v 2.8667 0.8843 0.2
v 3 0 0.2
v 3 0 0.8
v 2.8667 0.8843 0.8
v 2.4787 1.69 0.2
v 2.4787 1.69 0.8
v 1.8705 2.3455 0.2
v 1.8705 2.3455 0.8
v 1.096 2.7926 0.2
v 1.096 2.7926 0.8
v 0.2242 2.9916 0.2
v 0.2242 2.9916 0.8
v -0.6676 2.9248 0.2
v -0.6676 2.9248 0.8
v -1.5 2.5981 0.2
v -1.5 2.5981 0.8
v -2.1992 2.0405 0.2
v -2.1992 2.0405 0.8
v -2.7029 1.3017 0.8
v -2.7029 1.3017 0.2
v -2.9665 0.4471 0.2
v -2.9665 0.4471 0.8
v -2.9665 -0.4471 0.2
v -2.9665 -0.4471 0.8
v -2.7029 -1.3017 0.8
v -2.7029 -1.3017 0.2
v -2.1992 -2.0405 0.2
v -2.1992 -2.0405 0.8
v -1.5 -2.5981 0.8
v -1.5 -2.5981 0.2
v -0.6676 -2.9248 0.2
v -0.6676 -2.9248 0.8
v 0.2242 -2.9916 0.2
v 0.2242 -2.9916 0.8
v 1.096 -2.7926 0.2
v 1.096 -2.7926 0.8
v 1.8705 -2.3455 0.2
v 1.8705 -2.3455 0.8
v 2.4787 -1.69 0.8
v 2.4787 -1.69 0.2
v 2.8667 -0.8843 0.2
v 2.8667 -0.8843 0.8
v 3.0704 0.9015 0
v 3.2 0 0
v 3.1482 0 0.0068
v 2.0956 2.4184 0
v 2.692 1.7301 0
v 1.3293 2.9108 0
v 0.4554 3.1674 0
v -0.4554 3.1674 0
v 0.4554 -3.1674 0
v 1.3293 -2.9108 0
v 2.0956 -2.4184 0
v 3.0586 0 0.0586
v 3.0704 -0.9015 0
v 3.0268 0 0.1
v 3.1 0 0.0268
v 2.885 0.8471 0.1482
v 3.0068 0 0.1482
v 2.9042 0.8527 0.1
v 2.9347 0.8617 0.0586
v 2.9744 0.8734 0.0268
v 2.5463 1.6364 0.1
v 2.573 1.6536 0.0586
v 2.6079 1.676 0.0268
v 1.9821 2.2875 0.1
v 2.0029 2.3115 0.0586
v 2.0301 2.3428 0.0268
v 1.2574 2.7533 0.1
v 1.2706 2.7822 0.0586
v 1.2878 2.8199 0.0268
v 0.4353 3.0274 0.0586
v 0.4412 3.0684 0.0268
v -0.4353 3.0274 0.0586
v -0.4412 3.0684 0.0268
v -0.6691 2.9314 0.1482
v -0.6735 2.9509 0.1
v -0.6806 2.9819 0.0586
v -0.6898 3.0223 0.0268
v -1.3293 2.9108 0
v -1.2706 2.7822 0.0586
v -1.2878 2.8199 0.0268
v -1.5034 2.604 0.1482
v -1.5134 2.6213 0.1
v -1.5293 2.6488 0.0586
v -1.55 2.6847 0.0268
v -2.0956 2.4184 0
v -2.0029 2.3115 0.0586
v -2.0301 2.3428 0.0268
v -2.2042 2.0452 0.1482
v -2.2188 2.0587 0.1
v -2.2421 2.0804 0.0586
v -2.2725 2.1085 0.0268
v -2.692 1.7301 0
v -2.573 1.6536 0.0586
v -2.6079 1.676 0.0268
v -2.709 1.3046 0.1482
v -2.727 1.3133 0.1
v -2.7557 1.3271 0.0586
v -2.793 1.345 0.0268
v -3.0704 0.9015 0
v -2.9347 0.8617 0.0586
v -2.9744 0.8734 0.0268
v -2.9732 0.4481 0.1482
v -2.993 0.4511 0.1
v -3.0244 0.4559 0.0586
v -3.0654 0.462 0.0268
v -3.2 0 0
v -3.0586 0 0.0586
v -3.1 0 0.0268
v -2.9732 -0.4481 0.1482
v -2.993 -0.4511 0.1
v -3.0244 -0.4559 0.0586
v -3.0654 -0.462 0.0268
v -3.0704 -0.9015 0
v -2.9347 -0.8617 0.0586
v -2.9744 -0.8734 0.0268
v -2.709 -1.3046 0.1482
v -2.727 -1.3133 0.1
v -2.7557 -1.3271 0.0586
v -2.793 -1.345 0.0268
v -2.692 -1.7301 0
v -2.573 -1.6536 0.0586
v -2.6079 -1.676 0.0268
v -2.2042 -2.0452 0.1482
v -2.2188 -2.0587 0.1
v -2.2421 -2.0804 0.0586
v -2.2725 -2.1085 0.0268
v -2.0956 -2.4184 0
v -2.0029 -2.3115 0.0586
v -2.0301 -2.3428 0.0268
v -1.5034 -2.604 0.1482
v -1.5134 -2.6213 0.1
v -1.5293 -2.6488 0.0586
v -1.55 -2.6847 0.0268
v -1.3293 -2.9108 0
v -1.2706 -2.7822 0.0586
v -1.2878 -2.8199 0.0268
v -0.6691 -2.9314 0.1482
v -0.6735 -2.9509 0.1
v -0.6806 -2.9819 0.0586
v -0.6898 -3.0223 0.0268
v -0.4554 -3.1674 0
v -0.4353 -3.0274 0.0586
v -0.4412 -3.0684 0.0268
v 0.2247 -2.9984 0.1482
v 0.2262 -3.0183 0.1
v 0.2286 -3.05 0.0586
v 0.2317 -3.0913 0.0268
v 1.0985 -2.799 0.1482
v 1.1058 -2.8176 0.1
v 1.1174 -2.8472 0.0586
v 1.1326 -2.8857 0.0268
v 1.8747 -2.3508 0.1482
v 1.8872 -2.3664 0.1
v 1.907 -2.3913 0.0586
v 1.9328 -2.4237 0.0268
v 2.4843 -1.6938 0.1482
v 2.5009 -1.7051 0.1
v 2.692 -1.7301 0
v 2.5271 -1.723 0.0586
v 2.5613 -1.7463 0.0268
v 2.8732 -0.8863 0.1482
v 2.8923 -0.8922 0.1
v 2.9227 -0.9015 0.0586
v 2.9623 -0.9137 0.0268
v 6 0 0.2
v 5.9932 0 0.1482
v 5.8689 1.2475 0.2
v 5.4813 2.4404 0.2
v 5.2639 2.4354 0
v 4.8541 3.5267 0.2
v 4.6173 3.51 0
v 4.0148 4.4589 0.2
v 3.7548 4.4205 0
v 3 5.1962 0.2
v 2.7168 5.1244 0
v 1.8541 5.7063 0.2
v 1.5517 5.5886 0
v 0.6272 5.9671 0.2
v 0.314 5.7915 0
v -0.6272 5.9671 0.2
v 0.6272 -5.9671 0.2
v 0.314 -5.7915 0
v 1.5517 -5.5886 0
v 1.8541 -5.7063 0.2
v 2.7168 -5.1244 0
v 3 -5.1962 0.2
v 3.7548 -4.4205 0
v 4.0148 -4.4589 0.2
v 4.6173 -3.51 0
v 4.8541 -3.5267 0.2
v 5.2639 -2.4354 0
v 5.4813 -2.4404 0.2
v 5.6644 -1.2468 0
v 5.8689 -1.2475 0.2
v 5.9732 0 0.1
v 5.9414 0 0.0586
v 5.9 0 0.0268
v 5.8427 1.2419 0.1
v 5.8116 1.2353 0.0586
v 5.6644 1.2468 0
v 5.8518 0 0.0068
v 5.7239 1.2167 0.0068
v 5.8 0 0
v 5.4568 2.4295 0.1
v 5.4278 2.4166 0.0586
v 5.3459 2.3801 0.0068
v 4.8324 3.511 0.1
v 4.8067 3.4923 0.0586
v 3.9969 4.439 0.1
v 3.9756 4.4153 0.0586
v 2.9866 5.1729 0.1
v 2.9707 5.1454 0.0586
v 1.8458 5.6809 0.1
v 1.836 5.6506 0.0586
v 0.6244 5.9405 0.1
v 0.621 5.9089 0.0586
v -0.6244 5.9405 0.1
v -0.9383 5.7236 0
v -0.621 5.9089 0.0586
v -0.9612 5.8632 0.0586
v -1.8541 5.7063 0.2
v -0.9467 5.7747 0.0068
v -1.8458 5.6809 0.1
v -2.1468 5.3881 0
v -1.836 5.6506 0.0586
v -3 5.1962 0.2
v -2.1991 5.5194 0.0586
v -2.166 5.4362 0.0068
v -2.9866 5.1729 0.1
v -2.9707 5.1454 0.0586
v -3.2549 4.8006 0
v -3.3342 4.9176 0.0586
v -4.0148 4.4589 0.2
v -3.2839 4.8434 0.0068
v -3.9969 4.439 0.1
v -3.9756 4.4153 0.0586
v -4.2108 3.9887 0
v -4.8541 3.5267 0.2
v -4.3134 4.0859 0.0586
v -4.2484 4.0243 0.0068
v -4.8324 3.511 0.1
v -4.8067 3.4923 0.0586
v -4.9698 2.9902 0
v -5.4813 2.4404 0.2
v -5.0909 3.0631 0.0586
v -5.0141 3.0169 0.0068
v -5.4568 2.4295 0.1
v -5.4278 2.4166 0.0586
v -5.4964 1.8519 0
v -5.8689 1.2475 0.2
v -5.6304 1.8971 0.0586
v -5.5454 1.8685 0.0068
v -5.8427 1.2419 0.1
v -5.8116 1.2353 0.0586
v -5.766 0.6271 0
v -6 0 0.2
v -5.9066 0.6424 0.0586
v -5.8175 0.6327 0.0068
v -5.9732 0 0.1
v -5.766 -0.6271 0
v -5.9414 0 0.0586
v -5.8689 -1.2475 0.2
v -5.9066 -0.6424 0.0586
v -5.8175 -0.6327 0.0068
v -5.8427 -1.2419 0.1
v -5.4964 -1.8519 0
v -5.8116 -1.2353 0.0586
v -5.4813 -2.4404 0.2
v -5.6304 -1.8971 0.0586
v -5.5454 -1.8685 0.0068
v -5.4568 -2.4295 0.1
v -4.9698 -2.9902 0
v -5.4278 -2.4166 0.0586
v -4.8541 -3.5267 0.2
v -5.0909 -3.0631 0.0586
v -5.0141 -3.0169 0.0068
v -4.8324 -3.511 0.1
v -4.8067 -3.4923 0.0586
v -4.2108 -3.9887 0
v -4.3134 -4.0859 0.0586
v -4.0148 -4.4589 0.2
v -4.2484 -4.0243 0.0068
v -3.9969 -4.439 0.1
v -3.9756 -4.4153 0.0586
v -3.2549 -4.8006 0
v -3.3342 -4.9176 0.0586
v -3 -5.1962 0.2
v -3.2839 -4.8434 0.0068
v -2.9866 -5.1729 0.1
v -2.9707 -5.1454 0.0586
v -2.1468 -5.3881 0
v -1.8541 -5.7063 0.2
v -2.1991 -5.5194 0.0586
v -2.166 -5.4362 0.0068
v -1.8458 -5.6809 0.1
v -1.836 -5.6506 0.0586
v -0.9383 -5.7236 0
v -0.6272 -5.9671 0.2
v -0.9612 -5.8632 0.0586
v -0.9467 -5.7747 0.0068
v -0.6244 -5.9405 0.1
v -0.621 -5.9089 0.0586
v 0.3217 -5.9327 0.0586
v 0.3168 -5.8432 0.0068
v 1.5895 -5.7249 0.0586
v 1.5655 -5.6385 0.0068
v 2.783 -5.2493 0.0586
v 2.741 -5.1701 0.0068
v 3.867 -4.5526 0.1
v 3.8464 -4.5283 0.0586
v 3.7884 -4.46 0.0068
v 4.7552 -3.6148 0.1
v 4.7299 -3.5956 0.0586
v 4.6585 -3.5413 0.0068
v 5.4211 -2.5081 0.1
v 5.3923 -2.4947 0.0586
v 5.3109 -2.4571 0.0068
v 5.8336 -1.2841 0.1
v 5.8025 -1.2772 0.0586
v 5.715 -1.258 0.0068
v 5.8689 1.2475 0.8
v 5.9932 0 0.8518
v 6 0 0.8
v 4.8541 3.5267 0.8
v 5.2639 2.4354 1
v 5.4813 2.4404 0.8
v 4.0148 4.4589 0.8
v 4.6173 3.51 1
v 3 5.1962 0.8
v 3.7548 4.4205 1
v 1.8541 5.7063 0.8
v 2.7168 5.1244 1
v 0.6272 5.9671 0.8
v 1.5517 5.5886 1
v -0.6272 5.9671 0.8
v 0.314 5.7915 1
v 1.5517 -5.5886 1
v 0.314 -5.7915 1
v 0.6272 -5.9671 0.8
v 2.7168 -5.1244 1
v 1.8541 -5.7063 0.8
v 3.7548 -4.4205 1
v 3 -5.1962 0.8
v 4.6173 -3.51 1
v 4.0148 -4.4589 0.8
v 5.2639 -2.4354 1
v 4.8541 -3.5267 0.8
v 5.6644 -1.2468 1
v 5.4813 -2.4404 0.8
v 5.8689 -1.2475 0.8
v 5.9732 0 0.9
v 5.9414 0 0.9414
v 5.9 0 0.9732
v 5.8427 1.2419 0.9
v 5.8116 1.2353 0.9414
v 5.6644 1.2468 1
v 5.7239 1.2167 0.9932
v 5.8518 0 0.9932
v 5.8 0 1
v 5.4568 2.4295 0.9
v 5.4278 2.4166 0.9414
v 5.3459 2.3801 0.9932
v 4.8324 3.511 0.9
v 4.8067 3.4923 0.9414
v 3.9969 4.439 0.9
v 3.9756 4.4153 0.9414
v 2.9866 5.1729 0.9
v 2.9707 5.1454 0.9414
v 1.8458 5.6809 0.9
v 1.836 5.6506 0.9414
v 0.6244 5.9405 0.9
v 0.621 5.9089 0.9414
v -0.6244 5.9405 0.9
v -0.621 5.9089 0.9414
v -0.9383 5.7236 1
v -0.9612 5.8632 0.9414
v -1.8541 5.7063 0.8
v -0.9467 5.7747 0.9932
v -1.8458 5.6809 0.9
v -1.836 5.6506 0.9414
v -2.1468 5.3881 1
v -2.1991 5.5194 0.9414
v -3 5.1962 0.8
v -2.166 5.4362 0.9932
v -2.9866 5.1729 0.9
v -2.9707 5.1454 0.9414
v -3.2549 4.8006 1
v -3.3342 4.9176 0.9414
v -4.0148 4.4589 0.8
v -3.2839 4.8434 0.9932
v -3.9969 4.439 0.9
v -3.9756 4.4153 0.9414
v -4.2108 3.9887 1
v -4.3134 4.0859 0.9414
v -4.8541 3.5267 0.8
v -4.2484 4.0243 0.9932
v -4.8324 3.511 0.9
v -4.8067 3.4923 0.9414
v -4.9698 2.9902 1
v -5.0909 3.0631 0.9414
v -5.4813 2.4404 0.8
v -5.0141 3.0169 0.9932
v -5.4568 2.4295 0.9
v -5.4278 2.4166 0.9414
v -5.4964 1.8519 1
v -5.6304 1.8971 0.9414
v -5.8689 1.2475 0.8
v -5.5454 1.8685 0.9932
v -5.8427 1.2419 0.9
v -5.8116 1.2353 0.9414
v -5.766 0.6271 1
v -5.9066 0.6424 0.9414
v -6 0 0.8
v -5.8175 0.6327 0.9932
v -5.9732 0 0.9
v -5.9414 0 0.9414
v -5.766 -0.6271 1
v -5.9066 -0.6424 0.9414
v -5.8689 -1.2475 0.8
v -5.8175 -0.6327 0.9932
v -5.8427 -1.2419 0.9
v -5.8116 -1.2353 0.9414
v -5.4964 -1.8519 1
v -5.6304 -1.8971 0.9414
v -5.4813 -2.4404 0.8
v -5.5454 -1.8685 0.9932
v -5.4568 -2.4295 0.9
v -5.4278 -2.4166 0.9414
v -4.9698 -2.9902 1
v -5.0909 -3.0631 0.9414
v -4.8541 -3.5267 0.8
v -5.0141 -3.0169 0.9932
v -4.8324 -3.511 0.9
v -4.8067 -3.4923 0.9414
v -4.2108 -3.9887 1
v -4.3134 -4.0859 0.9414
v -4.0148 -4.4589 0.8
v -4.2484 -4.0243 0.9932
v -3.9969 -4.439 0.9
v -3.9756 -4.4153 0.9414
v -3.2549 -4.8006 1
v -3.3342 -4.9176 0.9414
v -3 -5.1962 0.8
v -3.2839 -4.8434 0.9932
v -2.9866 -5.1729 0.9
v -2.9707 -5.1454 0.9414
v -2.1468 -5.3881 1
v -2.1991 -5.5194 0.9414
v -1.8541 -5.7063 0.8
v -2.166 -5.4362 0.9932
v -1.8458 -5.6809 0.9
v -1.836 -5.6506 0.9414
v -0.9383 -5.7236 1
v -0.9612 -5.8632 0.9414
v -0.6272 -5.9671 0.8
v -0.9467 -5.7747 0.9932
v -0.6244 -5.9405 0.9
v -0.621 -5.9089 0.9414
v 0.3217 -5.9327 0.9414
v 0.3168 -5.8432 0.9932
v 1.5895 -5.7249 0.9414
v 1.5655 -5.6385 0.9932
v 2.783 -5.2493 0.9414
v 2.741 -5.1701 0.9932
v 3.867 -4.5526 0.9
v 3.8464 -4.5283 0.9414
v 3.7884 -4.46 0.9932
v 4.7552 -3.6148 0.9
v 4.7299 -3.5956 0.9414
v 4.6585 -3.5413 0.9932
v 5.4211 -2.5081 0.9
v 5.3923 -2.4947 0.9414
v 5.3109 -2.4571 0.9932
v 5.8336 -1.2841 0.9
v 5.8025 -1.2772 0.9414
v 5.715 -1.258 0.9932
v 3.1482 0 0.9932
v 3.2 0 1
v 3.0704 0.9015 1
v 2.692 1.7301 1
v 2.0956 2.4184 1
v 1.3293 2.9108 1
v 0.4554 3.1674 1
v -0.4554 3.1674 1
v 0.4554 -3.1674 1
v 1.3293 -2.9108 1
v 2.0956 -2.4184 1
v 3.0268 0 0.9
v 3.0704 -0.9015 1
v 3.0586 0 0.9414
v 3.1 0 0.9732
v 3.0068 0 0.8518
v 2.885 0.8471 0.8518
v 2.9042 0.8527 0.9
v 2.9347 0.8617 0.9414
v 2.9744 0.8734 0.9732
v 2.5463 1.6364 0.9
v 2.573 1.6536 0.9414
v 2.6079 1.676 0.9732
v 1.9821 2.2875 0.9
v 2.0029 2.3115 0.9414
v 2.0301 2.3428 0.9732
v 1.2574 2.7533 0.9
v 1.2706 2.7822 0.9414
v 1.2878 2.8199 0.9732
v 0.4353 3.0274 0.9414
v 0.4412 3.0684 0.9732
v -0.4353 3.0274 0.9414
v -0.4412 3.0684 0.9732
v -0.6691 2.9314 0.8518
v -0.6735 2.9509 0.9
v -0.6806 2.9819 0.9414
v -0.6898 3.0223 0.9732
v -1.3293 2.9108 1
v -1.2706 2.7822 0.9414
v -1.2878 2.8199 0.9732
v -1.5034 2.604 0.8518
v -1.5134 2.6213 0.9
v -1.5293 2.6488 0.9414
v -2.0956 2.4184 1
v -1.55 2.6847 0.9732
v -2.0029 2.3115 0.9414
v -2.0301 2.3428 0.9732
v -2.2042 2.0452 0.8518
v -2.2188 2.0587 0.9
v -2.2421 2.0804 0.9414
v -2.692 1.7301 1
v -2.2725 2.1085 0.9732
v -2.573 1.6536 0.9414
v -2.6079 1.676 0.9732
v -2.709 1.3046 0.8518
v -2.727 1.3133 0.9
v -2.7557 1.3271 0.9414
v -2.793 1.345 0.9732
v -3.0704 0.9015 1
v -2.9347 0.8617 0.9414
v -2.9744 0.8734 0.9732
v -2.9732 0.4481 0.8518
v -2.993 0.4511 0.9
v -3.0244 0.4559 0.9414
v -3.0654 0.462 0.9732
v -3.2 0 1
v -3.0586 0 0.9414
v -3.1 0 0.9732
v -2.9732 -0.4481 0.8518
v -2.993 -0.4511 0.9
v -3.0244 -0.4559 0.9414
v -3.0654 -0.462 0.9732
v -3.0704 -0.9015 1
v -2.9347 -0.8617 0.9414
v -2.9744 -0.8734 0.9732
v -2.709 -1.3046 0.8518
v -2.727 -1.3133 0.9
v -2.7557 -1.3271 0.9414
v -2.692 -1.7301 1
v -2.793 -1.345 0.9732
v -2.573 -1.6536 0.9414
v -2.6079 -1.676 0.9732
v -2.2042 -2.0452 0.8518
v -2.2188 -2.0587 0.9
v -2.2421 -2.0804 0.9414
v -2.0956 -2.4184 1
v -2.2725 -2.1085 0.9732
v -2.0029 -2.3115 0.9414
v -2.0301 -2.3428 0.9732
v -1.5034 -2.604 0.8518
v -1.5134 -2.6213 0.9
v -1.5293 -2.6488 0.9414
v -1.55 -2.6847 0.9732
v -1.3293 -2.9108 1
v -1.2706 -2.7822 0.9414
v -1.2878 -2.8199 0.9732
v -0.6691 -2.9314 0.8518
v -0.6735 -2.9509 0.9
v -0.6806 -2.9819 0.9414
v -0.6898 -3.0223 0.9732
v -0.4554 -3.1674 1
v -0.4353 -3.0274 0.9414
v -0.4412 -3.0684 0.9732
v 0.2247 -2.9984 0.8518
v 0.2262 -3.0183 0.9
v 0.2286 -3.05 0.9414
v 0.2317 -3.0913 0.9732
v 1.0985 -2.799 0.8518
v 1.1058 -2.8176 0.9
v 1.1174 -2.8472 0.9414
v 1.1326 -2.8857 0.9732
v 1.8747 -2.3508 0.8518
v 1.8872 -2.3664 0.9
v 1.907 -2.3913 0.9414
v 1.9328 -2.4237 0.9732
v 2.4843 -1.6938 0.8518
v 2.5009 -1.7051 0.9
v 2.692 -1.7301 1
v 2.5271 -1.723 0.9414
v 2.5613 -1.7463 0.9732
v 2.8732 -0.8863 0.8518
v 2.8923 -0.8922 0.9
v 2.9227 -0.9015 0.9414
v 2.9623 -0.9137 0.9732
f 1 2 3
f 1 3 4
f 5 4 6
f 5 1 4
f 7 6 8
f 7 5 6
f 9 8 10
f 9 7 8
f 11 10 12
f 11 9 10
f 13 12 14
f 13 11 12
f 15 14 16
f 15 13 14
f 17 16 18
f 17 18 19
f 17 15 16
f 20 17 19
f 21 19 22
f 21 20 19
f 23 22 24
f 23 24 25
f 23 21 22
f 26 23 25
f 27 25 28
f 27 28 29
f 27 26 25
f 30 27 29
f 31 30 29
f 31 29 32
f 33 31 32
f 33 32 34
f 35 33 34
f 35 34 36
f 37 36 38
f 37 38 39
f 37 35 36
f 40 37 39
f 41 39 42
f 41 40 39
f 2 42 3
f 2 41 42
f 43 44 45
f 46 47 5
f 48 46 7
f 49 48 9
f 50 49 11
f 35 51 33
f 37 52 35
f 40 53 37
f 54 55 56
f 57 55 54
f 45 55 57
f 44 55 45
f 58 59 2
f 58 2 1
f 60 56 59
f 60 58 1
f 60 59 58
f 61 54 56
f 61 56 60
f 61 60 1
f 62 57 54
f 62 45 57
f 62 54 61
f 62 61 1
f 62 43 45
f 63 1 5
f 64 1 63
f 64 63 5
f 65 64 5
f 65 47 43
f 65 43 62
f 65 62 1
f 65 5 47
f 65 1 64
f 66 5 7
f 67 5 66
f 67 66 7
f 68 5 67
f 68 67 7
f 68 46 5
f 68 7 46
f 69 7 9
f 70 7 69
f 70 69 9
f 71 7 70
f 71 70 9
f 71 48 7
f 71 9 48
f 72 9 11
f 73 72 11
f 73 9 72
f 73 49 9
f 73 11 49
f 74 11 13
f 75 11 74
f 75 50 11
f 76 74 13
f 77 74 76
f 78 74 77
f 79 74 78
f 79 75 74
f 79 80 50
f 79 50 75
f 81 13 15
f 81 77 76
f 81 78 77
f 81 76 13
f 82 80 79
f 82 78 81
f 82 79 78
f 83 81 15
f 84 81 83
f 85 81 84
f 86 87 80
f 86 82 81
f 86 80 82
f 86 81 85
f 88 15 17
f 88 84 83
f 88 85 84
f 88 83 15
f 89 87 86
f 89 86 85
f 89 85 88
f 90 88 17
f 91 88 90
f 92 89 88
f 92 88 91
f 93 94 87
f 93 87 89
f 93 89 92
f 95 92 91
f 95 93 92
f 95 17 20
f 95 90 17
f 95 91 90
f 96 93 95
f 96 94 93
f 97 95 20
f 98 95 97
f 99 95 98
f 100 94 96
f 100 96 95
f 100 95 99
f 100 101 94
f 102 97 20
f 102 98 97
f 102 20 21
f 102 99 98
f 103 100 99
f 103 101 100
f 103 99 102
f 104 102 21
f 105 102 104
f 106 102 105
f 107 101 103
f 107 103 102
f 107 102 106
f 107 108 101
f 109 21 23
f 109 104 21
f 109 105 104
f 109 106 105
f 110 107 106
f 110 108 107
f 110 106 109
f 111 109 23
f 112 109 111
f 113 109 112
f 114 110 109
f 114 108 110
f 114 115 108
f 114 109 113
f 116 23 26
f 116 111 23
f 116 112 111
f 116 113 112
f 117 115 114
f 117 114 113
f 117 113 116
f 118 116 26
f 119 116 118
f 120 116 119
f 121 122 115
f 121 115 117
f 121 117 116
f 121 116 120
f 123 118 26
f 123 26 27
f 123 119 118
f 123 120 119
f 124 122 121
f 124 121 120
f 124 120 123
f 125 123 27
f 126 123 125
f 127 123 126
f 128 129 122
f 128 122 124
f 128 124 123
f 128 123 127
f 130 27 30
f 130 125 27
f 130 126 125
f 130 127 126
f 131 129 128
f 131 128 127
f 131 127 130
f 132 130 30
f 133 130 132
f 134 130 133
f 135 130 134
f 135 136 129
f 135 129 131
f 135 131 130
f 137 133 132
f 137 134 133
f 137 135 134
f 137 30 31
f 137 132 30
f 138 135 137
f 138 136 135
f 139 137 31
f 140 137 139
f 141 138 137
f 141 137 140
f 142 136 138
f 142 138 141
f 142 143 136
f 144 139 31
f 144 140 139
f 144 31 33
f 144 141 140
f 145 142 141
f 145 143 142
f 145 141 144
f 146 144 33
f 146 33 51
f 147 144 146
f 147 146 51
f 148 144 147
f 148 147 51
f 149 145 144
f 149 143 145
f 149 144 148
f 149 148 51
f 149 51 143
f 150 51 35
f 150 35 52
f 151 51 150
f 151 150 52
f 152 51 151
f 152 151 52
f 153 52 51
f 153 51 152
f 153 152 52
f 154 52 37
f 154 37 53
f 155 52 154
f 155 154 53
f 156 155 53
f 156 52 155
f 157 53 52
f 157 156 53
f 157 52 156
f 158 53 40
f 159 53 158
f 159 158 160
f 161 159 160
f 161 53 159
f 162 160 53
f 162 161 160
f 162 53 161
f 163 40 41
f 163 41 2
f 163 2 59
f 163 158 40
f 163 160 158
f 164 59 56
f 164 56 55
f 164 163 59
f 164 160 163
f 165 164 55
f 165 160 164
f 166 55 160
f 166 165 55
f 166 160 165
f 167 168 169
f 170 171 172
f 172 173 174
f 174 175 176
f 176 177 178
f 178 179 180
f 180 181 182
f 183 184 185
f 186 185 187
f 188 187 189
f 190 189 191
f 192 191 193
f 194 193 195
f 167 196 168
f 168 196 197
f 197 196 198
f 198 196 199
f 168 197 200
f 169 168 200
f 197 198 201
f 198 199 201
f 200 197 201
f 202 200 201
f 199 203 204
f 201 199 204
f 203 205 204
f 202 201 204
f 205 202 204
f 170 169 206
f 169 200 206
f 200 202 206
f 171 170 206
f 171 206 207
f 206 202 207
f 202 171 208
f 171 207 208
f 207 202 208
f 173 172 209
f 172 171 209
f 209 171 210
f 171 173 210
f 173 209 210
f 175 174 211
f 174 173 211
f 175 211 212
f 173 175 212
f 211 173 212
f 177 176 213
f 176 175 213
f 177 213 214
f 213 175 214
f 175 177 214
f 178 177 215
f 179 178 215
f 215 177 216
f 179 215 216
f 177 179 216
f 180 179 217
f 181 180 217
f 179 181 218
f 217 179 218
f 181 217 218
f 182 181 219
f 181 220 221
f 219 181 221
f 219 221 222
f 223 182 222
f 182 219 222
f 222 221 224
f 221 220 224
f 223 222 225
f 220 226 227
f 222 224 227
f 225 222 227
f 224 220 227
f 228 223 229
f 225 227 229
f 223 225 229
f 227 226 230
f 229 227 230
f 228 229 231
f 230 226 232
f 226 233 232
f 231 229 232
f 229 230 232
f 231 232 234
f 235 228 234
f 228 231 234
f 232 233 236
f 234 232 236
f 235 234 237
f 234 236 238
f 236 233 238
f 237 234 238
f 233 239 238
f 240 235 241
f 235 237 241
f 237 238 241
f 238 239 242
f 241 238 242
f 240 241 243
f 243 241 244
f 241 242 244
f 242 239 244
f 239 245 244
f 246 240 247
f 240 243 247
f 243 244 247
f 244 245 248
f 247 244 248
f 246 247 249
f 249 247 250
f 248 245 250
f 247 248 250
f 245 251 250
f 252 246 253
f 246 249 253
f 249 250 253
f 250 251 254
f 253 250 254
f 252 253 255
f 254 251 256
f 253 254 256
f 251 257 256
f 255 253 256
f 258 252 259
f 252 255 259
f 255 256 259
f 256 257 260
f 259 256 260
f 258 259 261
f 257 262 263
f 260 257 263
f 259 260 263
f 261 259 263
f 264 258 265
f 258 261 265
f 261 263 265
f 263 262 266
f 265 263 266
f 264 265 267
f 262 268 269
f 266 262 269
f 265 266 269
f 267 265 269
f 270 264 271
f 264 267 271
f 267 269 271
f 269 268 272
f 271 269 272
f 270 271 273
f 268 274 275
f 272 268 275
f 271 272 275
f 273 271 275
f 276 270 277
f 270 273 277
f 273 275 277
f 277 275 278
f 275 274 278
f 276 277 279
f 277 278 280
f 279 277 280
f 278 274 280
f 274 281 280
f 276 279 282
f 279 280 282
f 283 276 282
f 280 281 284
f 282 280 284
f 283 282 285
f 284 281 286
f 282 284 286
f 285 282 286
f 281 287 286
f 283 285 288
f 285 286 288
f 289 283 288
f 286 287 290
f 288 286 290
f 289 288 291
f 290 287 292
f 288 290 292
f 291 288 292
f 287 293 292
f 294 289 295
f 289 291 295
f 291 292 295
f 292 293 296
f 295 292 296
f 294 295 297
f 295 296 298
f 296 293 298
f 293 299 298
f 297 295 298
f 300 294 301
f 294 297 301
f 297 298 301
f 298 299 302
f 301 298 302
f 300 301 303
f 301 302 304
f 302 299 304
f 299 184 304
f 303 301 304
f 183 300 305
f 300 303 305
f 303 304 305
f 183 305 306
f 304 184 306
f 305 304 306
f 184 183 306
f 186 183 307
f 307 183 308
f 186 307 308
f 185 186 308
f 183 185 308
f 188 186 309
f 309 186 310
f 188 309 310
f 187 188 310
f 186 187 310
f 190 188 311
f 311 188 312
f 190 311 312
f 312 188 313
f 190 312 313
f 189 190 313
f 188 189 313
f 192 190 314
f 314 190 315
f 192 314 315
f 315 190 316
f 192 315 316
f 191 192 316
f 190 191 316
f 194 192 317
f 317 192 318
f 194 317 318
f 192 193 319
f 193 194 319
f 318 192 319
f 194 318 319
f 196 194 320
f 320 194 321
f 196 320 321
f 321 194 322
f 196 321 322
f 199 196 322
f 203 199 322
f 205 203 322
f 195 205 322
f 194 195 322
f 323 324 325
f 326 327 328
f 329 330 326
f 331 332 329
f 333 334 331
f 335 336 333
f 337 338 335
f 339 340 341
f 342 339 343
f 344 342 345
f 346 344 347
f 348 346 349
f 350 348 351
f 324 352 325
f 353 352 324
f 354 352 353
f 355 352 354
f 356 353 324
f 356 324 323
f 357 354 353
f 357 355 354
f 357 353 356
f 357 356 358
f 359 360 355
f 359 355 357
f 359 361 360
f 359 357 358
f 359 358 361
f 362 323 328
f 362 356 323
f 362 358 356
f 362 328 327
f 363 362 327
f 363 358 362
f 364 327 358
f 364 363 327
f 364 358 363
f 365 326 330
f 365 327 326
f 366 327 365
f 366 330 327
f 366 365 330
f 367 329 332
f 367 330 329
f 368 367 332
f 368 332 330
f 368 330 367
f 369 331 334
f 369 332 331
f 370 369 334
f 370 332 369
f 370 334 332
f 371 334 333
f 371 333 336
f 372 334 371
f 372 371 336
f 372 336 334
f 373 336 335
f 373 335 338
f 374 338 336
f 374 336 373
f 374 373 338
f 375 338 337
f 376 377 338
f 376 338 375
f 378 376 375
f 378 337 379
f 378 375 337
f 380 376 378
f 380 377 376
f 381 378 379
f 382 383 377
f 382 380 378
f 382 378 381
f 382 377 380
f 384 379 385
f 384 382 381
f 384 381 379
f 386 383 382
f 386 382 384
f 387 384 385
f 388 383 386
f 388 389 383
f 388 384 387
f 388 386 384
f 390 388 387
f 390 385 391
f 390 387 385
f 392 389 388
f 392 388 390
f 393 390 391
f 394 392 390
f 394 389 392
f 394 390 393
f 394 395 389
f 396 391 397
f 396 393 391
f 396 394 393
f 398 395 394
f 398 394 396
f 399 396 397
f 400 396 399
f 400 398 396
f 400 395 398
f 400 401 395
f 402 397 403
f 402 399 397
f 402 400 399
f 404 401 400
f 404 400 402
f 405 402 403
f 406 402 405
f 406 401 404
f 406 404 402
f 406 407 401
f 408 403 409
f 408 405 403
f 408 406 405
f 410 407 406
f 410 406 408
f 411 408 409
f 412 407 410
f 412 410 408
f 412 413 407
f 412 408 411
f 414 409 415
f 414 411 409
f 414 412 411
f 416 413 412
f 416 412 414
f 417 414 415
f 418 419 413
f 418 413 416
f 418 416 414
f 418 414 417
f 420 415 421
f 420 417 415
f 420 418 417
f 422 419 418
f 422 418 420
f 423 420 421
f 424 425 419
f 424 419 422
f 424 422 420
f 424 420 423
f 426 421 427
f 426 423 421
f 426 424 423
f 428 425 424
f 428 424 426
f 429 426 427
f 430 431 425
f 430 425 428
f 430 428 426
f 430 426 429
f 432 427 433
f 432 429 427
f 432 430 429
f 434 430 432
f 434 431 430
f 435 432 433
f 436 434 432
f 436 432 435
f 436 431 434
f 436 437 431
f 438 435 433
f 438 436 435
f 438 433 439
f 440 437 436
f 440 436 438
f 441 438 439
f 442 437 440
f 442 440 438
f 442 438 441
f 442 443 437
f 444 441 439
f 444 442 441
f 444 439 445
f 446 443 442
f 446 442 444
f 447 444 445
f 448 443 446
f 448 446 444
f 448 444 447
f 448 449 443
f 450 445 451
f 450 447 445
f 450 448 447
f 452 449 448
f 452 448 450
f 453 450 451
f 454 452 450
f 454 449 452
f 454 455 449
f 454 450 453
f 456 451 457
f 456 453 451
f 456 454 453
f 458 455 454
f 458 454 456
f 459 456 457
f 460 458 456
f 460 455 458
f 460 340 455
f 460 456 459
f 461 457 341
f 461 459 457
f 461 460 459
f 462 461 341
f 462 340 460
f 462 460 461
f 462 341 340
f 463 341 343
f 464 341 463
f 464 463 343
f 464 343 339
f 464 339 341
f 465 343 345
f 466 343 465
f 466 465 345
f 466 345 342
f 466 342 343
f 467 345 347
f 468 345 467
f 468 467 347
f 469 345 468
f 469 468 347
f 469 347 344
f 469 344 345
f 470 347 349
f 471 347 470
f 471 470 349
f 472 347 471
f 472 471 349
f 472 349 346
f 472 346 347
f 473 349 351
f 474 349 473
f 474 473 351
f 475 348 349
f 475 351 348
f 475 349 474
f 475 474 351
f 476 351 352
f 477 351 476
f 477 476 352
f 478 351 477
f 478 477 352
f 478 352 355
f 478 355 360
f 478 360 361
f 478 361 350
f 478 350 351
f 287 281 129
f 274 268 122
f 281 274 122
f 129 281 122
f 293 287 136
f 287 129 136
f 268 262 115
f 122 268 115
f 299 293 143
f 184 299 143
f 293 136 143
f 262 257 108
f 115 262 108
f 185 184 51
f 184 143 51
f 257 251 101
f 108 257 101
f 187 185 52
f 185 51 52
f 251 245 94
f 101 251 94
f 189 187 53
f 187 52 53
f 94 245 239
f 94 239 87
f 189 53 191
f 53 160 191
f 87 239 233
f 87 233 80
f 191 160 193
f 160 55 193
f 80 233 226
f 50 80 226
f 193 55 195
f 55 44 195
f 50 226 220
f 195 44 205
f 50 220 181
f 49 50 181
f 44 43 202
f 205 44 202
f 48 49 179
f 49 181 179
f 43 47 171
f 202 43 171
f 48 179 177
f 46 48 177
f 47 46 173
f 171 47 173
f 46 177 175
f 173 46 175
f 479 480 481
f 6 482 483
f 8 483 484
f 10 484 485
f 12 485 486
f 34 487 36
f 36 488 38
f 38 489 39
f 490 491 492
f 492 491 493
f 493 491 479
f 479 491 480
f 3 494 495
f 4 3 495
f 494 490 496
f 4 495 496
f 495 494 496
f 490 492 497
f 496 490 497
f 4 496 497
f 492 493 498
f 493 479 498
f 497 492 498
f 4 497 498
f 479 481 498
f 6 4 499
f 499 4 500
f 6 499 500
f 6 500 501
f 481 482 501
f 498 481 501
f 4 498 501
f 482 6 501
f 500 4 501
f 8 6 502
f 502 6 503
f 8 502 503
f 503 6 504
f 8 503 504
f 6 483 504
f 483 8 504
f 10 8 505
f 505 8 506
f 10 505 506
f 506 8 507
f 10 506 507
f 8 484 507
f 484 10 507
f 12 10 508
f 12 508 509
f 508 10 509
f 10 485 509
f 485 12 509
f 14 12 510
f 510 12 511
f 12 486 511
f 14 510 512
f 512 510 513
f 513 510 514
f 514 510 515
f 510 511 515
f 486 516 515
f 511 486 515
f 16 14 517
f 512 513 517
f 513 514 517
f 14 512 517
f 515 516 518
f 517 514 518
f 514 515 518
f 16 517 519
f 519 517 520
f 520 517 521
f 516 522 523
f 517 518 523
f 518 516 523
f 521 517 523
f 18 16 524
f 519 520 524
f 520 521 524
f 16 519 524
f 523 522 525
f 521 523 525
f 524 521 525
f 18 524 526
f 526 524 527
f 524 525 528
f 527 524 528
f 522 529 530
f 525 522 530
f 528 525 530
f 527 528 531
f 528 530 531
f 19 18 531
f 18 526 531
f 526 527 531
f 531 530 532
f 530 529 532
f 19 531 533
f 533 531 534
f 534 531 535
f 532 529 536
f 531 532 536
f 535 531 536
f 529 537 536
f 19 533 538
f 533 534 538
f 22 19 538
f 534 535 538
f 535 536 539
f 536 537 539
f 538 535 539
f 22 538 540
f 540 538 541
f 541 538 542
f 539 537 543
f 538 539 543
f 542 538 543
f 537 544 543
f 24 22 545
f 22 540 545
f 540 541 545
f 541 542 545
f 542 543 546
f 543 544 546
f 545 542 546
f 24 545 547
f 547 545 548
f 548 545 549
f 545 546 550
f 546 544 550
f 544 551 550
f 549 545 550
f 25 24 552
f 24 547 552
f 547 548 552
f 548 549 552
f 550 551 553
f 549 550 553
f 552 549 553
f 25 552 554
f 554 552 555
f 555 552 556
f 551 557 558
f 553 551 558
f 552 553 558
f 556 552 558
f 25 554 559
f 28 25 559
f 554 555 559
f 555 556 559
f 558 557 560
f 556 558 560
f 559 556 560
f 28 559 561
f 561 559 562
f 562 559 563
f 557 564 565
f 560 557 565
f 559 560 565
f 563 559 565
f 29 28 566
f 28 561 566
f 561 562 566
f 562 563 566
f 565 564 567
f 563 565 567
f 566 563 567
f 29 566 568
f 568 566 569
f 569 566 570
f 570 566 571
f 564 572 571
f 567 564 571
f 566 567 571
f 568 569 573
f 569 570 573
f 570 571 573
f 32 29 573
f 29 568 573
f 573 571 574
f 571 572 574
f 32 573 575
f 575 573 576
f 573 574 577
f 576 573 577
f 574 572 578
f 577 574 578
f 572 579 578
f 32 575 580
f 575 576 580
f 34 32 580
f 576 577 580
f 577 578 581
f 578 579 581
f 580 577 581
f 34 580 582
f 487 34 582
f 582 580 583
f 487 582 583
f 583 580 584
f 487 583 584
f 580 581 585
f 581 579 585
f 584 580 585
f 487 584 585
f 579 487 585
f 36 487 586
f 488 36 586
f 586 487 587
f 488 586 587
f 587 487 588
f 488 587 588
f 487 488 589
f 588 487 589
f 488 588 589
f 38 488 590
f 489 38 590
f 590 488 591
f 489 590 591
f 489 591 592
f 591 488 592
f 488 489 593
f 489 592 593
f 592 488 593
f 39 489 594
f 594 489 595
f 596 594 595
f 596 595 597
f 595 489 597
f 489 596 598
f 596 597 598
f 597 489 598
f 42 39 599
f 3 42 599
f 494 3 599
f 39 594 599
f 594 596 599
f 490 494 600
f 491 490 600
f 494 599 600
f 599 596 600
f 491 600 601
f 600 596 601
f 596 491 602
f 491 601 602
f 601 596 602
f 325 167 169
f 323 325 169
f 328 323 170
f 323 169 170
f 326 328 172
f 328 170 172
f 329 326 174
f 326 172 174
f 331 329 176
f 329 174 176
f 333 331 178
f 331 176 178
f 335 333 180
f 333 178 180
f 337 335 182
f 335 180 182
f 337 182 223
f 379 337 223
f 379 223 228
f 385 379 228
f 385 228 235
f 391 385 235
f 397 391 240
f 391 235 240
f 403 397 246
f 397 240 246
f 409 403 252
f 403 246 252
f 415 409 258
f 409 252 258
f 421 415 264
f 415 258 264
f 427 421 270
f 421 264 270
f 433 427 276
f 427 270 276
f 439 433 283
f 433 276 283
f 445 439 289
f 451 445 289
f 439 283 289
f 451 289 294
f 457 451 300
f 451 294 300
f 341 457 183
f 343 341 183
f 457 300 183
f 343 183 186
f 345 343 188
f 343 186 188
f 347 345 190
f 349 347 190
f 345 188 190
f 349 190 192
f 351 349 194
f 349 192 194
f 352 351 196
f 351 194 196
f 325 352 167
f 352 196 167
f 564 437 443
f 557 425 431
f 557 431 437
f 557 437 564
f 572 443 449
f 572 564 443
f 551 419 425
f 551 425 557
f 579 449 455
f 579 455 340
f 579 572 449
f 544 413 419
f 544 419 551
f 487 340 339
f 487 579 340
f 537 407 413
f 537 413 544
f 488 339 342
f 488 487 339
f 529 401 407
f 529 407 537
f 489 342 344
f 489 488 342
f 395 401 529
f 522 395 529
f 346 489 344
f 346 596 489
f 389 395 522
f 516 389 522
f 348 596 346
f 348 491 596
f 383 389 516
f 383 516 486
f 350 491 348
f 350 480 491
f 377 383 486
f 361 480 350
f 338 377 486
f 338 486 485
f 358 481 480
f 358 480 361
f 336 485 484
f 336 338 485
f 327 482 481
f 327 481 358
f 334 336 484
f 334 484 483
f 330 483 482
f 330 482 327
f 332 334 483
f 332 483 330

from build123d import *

# Parameters (mm, degrees)
F1_R     = 6
F1_R_2   = 3
F2_DEPTH = 1
F3_R     = 0.2


with BuildPart() as f2:
    # F1 (on offset) → F2 (new body)
    with BuildSketch(Plane.XY):
        Circle(F1_R)
        Circle(F1_R_2, mode=Mode.SUBTRACT)
    extrude(amount=F2_DEPTH)

    # F3
    f3_edges = [f2.edges().sort_by_distance(p)[0] for p in [
        (6, 0, 0.5),
        (-6, 0, 0),
        (-6, 0, 1),
        (-3, 0, 0),
        (-3, 0, 1),
    ]]
    fillet(f3_edges, radius=F3_R)


solid = f2.part
